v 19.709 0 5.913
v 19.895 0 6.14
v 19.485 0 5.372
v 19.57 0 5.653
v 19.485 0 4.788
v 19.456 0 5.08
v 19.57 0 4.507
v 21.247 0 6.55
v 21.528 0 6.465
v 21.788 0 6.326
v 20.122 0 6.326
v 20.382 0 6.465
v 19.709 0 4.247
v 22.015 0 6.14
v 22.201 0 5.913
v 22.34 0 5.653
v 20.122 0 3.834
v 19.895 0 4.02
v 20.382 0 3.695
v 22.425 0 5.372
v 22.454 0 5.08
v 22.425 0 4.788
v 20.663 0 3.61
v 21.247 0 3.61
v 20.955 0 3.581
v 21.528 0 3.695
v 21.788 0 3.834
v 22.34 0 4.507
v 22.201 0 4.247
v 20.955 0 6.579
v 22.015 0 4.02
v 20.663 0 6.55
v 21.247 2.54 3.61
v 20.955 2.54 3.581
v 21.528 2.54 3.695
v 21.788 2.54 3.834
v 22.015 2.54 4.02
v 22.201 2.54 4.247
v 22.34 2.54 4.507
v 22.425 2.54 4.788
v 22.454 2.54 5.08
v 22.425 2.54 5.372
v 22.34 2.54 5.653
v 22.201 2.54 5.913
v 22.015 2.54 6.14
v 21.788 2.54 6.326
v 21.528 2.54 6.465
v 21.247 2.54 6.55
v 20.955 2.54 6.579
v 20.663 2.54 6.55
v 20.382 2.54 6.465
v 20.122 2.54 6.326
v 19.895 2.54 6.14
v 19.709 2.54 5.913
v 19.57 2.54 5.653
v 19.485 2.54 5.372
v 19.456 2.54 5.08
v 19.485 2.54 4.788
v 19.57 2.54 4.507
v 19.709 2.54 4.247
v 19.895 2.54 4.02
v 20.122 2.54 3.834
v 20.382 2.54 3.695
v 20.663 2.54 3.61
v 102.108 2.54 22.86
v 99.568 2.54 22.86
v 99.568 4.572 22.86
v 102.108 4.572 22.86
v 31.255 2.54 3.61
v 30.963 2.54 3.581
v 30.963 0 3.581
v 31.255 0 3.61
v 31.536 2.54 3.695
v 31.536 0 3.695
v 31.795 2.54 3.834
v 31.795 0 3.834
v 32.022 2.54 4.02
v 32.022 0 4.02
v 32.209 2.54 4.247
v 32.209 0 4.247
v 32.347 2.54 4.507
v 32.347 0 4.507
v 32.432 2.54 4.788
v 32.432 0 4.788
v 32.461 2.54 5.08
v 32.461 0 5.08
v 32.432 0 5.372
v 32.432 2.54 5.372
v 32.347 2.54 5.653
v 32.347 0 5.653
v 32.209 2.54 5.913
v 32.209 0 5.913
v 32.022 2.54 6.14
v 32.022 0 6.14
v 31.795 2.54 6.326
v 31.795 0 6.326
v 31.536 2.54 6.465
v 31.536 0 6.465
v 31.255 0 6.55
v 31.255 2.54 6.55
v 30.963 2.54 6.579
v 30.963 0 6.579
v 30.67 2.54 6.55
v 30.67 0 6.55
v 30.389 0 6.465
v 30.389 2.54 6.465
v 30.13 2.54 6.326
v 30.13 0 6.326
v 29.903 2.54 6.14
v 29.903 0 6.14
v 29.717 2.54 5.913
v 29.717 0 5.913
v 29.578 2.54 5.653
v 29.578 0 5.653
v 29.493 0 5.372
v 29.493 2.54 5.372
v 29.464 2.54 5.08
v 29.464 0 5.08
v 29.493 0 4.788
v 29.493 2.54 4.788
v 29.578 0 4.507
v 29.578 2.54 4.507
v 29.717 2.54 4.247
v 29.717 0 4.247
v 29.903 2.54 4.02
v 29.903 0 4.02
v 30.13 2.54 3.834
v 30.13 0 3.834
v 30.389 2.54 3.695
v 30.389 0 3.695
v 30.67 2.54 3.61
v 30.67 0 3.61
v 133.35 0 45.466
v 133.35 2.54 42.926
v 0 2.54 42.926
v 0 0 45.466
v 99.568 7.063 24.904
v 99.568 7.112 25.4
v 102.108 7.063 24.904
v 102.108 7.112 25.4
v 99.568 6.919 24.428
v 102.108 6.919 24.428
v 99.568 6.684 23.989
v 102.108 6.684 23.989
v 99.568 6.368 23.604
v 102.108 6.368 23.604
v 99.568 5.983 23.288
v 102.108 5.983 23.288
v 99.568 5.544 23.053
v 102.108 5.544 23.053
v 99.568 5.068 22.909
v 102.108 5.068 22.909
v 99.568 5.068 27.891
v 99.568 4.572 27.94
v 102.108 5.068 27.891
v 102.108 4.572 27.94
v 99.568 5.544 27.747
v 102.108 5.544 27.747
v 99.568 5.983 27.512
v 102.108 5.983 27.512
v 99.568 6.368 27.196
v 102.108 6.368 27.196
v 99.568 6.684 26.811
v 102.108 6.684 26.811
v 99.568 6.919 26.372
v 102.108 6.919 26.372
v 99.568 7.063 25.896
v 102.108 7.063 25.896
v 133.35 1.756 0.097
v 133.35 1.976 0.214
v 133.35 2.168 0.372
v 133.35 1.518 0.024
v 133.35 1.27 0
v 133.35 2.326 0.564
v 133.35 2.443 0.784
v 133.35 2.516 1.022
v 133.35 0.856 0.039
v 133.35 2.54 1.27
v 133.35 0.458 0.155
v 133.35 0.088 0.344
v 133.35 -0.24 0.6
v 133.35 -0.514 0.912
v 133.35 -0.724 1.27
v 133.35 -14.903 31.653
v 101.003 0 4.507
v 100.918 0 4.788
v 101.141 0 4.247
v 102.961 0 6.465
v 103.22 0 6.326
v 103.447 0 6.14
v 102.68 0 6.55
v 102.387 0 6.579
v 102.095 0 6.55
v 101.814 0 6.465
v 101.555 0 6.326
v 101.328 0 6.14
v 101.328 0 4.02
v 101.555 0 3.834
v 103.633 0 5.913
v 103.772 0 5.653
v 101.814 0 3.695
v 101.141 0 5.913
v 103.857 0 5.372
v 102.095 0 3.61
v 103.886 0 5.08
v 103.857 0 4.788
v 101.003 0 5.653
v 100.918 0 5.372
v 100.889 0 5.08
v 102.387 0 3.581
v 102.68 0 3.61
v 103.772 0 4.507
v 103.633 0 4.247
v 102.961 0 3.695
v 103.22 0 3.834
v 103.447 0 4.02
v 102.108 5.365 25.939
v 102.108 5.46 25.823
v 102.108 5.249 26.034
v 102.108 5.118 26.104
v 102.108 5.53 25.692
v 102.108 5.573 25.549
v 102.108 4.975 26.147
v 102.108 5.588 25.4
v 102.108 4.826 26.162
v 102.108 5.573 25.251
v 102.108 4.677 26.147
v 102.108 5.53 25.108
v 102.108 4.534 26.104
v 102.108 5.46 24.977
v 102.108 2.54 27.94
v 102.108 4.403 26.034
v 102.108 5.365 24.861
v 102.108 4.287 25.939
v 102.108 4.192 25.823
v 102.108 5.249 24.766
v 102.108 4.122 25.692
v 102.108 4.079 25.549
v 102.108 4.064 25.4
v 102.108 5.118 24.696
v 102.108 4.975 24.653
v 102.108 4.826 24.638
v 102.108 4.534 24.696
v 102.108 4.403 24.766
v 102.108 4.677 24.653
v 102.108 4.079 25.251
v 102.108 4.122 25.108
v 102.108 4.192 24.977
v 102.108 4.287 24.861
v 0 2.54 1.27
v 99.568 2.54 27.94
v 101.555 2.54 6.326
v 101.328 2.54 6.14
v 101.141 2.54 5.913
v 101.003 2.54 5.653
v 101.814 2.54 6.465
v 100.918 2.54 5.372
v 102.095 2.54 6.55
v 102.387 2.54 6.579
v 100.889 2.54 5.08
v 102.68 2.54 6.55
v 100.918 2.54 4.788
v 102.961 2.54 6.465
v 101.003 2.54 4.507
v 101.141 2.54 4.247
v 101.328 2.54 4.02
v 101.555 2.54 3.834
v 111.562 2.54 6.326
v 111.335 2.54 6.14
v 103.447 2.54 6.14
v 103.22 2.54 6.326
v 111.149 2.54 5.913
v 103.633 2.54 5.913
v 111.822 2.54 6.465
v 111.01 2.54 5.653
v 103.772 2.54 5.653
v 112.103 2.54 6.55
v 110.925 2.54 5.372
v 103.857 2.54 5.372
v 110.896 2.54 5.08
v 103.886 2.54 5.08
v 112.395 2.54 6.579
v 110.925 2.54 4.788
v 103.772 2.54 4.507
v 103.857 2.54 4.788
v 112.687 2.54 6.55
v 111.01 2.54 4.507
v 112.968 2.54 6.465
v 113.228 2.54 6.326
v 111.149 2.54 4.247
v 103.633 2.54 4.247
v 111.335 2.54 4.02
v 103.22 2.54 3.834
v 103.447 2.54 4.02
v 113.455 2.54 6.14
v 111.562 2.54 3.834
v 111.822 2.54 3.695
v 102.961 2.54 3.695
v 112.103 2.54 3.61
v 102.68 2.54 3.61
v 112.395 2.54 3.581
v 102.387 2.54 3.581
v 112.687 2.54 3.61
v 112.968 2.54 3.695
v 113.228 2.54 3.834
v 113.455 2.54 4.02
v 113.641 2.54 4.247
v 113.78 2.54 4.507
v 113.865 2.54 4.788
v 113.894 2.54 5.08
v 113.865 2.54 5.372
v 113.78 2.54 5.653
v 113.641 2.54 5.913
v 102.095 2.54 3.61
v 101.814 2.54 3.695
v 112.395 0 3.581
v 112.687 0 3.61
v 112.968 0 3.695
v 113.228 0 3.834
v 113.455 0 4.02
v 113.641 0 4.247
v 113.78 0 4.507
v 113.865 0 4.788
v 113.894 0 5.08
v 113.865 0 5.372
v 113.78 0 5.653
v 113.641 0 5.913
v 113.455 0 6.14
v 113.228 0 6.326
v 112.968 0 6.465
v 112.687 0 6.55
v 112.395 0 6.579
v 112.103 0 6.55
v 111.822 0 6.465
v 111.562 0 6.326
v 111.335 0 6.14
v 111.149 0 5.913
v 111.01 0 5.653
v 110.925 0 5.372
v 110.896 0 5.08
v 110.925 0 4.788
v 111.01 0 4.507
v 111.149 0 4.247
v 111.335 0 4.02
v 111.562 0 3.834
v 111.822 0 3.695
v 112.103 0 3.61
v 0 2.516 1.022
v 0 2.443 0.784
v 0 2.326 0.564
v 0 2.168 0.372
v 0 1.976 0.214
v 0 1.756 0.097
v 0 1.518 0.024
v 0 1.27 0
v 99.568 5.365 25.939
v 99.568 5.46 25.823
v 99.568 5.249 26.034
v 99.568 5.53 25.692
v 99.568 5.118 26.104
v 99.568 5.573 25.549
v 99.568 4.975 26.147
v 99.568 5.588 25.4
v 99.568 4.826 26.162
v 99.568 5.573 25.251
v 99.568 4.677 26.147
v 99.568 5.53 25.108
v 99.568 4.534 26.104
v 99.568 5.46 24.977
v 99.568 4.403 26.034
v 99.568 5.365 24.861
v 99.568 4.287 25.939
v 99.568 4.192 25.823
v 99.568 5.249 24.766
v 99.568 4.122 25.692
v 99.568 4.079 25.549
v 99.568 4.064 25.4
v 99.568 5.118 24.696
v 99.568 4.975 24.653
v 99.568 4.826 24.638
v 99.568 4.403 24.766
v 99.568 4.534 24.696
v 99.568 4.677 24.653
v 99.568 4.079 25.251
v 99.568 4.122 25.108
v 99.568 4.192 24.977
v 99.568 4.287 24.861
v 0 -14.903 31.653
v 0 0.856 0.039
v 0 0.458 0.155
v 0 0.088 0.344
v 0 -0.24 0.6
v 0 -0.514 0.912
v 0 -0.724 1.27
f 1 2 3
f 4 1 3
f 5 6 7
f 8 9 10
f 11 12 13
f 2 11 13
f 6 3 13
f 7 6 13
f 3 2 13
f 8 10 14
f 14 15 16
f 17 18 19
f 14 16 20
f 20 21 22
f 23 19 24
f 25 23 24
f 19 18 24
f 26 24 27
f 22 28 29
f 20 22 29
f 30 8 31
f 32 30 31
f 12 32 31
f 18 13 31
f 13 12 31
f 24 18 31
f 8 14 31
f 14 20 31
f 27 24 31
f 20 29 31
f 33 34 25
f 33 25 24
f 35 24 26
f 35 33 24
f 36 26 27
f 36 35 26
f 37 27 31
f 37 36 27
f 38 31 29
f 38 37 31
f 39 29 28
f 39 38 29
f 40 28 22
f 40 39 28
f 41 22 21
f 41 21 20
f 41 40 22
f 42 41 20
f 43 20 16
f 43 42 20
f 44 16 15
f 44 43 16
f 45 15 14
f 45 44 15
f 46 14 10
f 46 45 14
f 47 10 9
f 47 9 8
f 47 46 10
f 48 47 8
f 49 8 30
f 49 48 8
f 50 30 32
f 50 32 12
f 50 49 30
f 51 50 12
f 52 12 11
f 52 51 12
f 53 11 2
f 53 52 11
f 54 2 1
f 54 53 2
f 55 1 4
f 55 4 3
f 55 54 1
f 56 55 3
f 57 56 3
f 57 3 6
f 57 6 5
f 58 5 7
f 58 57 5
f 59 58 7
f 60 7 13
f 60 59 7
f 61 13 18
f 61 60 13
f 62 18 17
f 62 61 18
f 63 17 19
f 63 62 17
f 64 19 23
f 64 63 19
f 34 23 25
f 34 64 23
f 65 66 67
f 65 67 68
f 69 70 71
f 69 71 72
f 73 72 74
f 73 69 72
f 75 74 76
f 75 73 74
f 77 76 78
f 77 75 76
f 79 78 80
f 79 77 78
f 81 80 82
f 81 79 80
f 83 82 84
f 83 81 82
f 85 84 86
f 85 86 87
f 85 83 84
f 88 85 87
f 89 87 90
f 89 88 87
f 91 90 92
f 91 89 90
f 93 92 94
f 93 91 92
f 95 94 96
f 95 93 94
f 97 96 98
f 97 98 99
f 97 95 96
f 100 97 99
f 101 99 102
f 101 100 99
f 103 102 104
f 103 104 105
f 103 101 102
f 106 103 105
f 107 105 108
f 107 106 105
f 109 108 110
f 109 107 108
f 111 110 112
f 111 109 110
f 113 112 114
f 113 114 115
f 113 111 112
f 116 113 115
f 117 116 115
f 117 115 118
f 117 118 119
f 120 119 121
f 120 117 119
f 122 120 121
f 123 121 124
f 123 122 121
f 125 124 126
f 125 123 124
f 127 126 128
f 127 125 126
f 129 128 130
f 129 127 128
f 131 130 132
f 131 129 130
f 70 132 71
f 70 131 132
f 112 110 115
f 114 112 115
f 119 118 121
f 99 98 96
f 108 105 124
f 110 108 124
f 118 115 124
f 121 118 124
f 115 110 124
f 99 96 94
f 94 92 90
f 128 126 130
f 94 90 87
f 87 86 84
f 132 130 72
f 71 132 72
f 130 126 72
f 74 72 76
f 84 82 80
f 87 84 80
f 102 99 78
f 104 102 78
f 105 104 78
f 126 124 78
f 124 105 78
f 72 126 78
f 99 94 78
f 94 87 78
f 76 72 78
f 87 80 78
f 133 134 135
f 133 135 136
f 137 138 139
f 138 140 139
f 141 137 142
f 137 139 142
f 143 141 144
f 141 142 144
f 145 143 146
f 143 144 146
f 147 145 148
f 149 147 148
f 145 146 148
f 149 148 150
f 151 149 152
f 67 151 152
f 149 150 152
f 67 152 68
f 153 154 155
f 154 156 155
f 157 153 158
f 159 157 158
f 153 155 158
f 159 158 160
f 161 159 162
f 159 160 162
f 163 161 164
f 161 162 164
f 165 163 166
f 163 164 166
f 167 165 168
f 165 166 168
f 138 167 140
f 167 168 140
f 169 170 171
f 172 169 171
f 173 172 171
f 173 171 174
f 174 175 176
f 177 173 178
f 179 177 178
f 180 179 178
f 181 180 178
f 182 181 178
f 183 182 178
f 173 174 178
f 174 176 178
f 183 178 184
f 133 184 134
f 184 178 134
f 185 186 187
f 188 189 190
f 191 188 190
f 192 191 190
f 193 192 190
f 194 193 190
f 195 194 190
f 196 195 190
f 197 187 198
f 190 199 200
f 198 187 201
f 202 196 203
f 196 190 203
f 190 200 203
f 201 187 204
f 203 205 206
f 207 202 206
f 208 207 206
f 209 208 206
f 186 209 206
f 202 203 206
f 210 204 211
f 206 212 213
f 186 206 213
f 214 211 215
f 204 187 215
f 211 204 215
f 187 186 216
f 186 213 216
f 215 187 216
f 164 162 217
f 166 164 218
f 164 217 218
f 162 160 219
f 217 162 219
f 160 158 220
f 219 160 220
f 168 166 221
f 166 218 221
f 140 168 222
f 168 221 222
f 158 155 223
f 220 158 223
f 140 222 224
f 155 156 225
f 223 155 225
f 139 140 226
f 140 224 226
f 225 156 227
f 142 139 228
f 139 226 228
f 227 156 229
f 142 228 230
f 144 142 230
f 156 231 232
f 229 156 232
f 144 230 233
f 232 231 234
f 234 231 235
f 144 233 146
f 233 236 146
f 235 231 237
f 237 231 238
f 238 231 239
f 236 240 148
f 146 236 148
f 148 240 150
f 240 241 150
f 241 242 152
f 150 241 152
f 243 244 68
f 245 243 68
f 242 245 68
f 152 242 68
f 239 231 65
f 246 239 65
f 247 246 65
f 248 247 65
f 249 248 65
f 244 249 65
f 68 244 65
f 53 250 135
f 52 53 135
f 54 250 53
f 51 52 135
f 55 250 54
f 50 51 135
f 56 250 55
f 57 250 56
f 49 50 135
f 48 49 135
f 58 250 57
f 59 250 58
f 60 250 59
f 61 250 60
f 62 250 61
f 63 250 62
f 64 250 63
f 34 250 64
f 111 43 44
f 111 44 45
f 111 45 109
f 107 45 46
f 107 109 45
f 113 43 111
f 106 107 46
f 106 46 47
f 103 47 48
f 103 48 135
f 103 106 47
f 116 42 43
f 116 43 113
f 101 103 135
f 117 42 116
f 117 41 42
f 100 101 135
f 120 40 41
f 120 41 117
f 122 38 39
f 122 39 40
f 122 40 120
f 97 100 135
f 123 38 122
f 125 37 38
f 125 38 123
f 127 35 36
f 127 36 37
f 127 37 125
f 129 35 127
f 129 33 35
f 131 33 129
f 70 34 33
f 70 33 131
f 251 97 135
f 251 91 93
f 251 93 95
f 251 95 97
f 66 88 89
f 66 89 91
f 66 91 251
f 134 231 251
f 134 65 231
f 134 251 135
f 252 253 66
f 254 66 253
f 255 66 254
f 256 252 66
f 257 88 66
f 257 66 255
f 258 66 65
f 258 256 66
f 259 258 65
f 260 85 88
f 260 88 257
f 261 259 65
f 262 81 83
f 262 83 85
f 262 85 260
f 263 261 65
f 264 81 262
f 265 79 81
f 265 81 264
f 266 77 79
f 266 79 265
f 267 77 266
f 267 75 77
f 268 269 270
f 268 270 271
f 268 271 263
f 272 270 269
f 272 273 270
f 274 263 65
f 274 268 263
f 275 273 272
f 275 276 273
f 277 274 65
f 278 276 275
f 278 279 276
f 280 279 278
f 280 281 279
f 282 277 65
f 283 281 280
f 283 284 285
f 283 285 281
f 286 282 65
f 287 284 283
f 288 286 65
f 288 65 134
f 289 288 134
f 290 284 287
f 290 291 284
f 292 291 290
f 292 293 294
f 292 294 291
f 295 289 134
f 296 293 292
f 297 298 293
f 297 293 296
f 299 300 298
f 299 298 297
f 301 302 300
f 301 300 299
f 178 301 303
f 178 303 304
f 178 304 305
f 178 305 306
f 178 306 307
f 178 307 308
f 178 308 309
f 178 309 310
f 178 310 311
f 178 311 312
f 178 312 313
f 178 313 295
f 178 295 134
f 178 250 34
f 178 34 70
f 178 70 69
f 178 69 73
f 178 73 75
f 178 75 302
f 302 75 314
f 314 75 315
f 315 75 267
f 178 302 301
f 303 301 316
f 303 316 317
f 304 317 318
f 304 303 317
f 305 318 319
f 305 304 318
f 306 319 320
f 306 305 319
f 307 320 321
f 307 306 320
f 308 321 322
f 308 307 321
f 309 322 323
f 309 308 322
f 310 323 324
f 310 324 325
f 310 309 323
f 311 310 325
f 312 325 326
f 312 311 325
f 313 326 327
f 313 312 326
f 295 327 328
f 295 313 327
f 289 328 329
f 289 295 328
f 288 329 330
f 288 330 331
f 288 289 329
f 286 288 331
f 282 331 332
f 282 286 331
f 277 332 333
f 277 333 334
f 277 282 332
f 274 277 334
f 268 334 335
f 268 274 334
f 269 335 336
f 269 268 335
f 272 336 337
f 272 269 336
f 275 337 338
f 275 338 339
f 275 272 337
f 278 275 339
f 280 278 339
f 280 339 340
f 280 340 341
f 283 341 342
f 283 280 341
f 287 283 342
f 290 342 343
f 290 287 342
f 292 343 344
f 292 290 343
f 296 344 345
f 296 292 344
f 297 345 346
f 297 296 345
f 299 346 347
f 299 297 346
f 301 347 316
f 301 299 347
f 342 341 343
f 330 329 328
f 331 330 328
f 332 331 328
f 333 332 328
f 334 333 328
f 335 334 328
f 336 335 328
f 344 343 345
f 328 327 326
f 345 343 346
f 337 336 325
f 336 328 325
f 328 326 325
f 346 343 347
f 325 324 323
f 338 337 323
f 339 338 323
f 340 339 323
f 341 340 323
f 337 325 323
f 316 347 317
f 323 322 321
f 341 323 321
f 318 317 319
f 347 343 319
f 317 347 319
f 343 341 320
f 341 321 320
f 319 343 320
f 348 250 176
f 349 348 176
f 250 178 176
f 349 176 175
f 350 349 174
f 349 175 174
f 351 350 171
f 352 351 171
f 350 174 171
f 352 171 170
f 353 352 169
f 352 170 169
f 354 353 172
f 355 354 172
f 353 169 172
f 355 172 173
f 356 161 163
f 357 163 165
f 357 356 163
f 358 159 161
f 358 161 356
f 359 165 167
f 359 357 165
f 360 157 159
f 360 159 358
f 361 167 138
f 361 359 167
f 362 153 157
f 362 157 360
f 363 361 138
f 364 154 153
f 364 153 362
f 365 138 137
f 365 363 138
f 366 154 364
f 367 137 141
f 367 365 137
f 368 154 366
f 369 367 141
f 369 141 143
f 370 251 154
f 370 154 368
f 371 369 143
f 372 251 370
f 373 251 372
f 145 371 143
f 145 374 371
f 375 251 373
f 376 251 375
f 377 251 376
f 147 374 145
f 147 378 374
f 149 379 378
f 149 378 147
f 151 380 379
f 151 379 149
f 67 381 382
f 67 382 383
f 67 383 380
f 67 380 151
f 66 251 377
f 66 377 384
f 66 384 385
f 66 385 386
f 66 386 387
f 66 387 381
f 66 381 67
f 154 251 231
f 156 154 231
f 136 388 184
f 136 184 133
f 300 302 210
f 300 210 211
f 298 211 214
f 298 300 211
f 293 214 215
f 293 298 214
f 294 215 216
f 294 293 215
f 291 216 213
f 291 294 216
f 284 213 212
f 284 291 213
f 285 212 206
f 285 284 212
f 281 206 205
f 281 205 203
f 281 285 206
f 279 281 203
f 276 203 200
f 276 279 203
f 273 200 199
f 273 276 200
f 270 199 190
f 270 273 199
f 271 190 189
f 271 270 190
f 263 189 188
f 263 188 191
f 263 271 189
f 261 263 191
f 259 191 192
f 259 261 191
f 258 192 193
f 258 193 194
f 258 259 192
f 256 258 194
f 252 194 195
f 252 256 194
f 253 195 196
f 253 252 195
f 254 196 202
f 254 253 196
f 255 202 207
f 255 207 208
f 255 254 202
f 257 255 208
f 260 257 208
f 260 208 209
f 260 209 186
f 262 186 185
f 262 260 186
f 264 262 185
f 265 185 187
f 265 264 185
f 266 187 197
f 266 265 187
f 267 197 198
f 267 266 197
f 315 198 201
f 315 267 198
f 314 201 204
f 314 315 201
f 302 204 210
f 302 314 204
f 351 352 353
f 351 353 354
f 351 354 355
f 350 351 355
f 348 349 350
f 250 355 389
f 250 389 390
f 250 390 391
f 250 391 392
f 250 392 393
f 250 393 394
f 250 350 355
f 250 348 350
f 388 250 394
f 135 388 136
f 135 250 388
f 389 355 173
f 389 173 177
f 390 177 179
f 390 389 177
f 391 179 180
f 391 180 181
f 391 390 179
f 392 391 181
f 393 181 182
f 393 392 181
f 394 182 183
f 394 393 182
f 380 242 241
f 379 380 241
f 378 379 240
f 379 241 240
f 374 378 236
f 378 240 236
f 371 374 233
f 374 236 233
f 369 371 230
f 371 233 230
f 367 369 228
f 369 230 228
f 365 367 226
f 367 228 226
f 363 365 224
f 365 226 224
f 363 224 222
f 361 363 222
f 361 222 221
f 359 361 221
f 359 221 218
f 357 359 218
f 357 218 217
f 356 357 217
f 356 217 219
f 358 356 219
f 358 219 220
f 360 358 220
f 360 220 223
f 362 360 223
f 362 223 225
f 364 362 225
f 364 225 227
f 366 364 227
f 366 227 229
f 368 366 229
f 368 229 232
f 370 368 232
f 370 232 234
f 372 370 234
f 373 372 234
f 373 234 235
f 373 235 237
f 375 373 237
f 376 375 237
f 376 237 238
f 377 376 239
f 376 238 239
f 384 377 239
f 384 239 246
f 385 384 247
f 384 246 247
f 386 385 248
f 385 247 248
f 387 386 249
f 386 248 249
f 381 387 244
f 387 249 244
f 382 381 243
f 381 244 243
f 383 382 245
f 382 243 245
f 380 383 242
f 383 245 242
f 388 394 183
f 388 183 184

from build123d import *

# Parameters (mm, degrees)
SKETCH1_W           = 133.35
SKETCH1_H           = 45.466
BOSS_EXTRUDE1_DEPTH = 2.54
CUT_EXTRUDE1_DEPTH  = 141.91072087
SKETCH4_W           = 2.54
SKETCH4_H           = 5.08
BOSS_EXTRUDE2_DEPTH = 4.572
SKETCH5_R           = 0.762
CUT_EXTRUDE2_DEPTH  = 112.999023942
FILLET1_R           = 2.54
FILLET2_R           = 2.54
FILLET3_R           = 1.27
BOSS_EXTRUDE4_DEPTH = 133.35
SKETCH10_R          = 1.4986
CUT_EXTRUDE3_DEPTH  = 2.54


with BuildPart() as part:
    # Sketch1 → Boss-Extrude1 (new body)
    with BuildSketch(Plane(origin=(0, 0, 0), x_dir=(1, 0, 0), z_dir=(0, 1, 0))):
        with Locations((66.675, -22.733)):
            Rectangle(SKETCH1_W, SKETCH1_H)
    extrude(amount=BOSS_EXTRUDE1_DEPTH)

    # Sketch2 → Cut-Extrude1 (cut, through all)
    with BuildSketch(Plane(origin=(133.35, 0, 0), x_dir=(0, 0, -1), z_dir=(1, 0, 0))):
        Polygon((-45.466, 0), (-45.466, 2.54), (-42.926, 2.54), align=None)
    extrude(amount=-CUT_EXTRUDE1_DEPTH, mode=Mode.SUBTRACT)

    # Sketch4 → Boss-Extrude2 (add)
    with BuildSketch(Plane(origin=(0, 2.54, 0), x_dir=(1, 0, 0), z_dir=(0, 1, 0))):
        with Locations((100.838, -25.4)):
            Rectangle(SKETCH4_W, SKETCH4_H)
    extrude(amount=BOSS_EXTRUDE2_DEPTH)

    # Sketch5 → Cut-Extrude2 (cut, through all)
    with BuildSketch(Plane(origin=(102.108, 0, 0), x_dir=(0, 0, -1), z_dir=(1, 0, 0))):
        with Locations((-25.4, 4.826)):
            Circle(SKETCH5_R)
    extrude(amount=-CUT_EXTRUDE2_DEPTH, mode=Mode.SUBTRACT)

    # Fillet1
    fillet1_edges = [part.edges().sort_by_distance(p)[0] for p in [
        (100.838, 7.112, 27.94),
    ]]
    fillet(fillet1_edges, radius=FILLET1_R)

    # Fillet2
    fillet2_edges = [part.edges().sort_by_distance(p)[0] for p in [
        (100.838, 7.112, 22.86),
    ]]
    fillet(fillet2_edges, radius=FILLET2_R - 0.0001)  # a hair under: the kernel refuses the full size

    # Fillet3
    fillet3_edges = [part.edges().sort_by_distance(p)[0] for p in [
        (66.675, 0, 0),
        (66.675, 2.54, 0),
    ]]
    fillet(fillet3_edges, radius=FILLET3_R - 0.0001)  # a hair under: the kernel refuses the full size

    # Sketch8 → Boss-Extrude4 (add)
    with BuildSketch(Plane.ZY):
        Polygon((1.27, -0.724150623), (31.652500271, -14.902671748), (45.466, 0), (1.27, 0), align=None)
        with BuildLine():
            ThreePointArc((0, 1.27), (0.344458941, 0.087889947), (1.27, -0.724150623))
            Line((1.27, -0.724150623), (1.27, 0))
            ThreePointArc((1.27, 0), (0.371974388, 0.371974388), (0, 1.27))
        make_face()
    extrude(amount=-BOSS_EXTRUDE4_DEPTH)

    # Sketch10 → Cut-Extrude3 (cut)
    with BuildSketch(Plane(origin=(0, 2.54, 0.507603591), x_dir=(1, 0, 0), z_dir=(0, -1, 0))):
        with Locations(Location((20.955, 4.572396409, 0), (0, 0, 270))):
            Circle(SKETCH10_R)
        with Locations(Location((30.9626, 4.572396409, 0), (0, 0, 270))):
            Circle(SKETCH10_R)
        with Locations(Location((102.3874, 4.572396409, 0), (0, 0, 270))):
            Circle(SKETCH10_R)
        with Locations(Location((112.395, 4.572396409, 0), (0, 0, 270))):
            Circle(SKETCH10_R)
    extrude(amount=CUT_EXTRUDE3_DEPTH, mode=Mode.SUBTRACT)


solid = part.part
